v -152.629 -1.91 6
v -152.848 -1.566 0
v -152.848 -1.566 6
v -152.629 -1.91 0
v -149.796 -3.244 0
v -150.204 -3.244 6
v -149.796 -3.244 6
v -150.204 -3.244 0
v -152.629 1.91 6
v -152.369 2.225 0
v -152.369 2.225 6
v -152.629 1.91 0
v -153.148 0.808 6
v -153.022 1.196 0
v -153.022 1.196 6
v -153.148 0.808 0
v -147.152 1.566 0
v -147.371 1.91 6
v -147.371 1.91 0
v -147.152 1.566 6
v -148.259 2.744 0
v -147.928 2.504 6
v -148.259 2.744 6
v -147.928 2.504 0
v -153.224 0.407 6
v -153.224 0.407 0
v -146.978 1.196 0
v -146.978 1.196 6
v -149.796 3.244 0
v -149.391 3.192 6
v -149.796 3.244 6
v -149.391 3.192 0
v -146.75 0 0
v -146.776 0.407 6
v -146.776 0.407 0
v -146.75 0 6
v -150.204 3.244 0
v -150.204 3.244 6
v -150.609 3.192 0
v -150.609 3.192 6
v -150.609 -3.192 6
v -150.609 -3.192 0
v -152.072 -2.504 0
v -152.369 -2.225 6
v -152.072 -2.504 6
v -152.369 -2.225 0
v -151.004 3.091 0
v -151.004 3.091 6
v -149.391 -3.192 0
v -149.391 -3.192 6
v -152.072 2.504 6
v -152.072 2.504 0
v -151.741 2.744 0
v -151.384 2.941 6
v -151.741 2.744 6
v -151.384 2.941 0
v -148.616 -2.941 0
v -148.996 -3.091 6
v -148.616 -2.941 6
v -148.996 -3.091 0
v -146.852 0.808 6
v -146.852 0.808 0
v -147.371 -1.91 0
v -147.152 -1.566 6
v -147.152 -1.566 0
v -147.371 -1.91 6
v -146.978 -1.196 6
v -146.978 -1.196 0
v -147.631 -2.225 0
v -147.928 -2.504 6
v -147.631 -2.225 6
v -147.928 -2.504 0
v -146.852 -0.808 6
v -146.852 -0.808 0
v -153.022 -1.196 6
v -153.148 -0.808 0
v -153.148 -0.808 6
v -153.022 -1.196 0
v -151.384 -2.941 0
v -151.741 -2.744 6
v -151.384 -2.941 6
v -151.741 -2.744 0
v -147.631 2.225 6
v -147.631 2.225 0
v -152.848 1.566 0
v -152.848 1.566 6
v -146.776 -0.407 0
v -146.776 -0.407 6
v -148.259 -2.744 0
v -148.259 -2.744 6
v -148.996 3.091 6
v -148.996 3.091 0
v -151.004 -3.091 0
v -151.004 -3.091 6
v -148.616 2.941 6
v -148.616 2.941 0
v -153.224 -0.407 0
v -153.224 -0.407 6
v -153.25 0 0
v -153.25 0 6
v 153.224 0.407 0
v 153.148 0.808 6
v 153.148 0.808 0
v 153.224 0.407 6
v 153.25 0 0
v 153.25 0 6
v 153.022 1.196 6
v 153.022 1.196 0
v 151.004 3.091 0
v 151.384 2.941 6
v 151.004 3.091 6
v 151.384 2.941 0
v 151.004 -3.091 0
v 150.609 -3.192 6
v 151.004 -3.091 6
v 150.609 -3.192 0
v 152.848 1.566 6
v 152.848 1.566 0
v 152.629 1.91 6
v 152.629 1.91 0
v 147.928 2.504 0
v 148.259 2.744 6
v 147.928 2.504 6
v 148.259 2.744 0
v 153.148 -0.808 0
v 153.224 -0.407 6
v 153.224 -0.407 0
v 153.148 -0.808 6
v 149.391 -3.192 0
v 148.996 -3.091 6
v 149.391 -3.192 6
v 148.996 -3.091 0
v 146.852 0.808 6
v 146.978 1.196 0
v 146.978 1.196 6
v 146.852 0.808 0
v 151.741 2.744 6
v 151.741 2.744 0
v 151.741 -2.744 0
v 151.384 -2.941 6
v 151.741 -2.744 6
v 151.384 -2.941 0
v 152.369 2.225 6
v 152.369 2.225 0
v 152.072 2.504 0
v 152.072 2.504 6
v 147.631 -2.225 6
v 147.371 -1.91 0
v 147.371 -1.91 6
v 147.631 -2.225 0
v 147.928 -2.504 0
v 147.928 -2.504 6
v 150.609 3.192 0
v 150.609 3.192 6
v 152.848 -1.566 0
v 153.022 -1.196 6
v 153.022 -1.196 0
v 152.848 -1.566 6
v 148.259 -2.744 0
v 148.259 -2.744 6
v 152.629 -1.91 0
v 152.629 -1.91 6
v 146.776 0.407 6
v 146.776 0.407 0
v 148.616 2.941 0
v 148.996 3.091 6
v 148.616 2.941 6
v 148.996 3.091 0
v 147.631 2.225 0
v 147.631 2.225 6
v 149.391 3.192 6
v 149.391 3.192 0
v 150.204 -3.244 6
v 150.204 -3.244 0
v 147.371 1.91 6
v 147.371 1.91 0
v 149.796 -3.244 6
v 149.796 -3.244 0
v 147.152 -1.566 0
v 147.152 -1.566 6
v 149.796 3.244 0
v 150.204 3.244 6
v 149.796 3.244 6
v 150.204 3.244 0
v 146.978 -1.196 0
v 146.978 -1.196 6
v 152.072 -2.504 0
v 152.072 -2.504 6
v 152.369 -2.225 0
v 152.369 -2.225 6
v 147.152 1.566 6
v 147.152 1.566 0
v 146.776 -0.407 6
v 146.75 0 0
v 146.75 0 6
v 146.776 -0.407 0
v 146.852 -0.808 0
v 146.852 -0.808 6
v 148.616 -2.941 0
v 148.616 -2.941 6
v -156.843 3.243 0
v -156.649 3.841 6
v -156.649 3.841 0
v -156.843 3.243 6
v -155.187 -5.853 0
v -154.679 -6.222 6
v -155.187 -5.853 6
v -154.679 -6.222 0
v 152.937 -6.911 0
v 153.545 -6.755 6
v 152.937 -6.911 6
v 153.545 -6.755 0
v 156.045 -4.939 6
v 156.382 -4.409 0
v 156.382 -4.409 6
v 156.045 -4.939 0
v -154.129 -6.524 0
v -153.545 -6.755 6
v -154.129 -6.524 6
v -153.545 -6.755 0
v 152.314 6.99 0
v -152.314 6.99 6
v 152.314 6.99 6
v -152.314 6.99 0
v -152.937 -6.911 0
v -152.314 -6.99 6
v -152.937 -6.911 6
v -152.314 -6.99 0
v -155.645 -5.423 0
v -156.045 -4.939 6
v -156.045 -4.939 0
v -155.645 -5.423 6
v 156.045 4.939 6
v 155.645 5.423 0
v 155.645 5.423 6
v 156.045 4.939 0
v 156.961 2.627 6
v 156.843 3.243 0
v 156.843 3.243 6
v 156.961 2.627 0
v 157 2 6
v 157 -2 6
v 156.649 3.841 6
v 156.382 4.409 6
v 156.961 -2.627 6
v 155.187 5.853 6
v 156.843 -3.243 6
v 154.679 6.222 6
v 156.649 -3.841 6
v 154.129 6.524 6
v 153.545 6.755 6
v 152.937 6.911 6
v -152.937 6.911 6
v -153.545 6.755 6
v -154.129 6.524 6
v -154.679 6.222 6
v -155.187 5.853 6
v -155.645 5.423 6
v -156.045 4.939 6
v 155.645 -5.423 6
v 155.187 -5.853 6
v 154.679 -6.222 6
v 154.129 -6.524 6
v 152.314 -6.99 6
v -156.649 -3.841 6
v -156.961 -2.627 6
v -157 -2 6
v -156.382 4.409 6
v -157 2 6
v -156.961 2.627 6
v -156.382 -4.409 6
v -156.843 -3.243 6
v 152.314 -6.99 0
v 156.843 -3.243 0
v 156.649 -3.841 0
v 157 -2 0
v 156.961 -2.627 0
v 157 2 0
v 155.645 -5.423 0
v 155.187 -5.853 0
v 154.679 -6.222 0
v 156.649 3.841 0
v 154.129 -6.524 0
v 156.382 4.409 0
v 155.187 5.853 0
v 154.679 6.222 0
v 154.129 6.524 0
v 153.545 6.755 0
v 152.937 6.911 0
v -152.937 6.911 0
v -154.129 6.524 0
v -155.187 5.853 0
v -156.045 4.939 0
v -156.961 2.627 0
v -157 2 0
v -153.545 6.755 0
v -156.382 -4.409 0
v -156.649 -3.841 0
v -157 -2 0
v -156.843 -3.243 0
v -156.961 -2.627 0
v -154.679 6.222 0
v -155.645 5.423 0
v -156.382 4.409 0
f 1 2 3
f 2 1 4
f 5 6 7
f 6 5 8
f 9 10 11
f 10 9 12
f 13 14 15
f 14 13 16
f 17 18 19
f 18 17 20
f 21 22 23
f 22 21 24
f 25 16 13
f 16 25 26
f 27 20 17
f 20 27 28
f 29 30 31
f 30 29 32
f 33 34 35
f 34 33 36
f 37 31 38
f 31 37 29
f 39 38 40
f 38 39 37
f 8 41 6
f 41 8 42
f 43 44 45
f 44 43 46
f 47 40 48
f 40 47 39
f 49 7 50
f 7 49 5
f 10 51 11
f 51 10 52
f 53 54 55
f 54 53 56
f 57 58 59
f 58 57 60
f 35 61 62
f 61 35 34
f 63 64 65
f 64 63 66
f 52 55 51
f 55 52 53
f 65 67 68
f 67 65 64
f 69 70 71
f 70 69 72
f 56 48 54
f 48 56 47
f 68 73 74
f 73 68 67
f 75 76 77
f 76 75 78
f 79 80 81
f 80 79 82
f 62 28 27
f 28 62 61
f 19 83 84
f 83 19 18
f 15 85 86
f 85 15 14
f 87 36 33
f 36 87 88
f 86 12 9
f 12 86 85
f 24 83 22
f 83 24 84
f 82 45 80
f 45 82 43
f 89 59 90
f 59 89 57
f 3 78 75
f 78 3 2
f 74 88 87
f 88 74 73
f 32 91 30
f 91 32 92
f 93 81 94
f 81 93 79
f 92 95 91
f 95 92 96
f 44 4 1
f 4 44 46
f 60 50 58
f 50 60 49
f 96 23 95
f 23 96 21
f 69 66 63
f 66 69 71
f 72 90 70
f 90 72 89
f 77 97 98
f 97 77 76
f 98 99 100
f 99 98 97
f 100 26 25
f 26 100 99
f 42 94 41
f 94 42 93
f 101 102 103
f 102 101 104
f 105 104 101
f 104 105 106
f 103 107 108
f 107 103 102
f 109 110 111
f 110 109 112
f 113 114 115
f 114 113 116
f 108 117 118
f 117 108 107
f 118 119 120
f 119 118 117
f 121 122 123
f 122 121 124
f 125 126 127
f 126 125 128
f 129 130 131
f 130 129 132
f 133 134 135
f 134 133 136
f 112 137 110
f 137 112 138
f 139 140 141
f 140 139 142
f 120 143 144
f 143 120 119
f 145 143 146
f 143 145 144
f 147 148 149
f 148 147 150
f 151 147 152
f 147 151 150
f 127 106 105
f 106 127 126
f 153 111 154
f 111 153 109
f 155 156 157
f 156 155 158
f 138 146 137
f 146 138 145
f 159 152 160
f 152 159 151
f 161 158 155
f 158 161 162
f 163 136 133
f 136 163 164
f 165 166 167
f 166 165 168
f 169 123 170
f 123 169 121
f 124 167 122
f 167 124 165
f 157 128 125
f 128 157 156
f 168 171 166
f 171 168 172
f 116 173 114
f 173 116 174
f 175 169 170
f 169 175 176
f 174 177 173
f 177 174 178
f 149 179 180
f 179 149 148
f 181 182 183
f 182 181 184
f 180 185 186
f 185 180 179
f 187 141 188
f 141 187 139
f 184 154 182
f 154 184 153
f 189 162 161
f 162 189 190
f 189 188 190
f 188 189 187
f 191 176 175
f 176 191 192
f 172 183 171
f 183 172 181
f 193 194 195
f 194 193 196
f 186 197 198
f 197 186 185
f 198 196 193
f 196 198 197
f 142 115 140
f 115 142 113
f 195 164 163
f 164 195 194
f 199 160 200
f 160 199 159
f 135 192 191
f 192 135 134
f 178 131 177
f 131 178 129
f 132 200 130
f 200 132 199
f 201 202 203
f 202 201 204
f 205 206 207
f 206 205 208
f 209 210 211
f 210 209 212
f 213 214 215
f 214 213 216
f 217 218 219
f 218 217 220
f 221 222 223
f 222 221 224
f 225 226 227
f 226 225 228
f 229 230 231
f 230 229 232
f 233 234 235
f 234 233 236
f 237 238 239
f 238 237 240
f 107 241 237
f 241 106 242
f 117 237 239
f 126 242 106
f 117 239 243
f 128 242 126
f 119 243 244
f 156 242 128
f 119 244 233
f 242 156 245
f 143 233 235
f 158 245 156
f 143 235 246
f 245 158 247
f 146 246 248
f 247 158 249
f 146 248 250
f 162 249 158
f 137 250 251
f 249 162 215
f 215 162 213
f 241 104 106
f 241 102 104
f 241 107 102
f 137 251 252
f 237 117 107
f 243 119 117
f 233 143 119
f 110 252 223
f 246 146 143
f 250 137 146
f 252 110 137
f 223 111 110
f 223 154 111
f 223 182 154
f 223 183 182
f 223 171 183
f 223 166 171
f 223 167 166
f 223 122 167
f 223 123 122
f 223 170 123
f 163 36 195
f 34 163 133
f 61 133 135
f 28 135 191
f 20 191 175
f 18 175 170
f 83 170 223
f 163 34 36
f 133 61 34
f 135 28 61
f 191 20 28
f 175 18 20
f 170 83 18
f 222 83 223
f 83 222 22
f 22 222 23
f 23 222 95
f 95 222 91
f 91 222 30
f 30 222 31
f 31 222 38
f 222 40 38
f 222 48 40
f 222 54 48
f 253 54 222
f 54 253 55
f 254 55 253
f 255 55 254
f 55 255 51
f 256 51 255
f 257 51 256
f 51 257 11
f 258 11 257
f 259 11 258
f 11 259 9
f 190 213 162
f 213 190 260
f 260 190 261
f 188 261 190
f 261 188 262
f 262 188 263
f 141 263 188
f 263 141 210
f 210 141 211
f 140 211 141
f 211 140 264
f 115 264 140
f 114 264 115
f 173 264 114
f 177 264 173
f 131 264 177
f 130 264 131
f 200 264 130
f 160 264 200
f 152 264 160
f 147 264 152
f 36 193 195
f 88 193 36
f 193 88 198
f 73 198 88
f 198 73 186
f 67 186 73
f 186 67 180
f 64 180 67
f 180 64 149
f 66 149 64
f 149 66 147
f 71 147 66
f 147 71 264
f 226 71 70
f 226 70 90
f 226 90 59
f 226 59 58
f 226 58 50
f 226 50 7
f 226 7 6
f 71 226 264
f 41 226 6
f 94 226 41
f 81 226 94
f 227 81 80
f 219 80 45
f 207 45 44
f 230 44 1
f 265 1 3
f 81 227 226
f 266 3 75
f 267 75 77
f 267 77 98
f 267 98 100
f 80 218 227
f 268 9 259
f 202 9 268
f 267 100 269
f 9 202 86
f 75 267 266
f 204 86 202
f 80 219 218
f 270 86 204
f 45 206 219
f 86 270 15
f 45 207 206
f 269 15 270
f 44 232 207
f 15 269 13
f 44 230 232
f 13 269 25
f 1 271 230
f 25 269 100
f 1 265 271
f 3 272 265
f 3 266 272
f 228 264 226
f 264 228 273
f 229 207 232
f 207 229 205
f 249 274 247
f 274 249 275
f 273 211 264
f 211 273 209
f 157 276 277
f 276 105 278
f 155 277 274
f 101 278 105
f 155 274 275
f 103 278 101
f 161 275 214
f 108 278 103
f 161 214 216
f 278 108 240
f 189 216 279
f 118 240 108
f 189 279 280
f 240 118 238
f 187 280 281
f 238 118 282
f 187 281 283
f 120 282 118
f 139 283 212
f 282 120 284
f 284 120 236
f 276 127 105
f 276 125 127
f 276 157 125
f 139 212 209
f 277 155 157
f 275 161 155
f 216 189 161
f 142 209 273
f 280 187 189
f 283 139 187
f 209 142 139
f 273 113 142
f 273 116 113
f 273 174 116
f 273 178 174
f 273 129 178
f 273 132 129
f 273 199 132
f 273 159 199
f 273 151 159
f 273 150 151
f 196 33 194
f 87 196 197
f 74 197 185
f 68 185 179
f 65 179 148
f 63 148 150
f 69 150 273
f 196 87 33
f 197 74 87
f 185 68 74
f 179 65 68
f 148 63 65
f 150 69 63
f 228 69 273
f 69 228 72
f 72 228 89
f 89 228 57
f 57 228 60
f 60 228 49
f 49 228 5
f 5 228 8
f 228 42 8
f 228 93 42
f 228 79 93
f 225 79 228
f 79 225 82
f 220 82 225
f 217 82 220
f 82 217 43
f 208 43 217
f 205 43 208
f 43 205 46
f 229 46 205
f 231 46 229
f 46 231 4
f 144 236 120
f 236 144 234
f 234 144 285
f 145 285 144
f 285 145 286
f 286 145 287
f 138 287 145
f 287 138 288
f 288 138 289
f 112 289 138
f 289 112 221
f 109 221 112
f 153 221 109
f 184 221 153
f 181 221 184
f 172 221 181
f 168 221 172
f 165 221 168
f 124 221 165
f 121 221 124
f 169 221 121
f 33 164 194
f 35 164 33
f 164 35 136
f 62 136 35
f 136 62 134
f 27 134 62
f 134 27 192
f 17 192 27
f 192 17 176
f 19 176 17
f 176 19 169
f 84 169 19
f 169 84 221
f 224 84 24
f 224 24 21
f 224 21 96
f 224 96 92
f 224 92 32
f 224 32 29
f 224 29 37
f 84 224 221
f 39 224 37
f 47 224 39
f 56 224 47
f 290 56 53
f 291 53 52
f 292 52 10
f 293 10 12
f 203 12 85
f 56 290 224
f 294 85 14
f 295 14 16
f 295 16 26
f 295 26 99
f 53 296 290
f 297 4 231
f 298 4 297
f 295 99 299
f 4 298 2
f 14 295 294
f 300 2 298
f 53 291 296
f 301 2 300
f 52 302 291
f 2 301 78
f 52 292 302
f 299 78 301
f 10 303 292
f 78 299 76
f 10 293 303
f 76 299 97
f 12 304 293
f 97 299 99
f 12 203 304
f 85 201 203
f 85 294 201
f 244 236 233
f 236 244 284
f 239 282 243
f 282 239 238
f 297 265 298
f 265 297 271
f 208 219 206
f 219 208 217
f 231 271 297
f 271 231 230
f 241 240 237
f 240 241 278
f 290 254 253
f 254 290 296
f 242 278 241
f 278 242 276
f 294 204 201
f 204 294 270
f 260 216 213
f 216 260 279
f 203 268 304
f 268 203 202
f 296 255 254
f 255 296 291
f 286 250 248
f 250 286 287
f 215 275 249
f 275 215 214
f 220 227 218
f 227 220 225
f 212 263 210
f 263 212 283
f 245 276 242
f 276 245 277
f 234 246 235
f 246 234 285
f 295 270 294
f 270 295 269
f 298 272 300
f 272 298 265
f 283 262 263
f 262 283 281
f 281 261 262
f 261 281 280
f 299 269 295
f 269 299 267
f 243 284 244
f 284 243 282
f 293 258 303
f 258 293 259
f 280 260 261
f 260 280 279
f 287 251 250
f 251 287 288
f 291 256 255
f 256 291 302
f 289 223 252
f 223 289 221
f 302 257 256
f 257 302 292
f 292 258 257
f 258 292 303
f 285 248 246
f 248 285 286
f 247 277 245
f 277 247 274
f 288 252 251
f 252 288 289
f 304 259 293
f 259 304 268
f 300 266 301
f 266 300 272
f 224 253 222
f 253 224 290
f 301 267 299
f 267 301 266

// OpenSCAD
$fn = 50;


difference() {
	union() {
		hull() {
			translate(v = [-152.0000000000, 2.0000000000, 0]) {
				cylinder(h = 6, r = 5);
			}
			translate(v = [152.0000000000, 2.0000000000, 0]) {
				cylinder(h = 6, r = 5);
			}
			translate(v = [-152.0000000000, -2.0000000000, 0]) {
				cylinder(h = 6, r = 5);
			}
			translate(v = [152.0000000000, -2.0000000000, 0]) {
				cylinder(h = 6, r = 5);
			}
		}
	}
	union() {
		translate(v = [-150.0000000000, 0.0000000000, -100.0000000000]) {
			cylinder(h = 200, r = 3.2500000000);
		}
		translate(v = [-150.0000000000, 0.0000000000, -100.0000000000]) {
			cylinder(h = 200, r = 3.2500000000);
		}
		translate(v = [150.0000000000, 0.0000000000, -100.0000000000]) {
			cylinder(h = 200, r = 3.2500000000);
		}
		translate(v = [150.0000000000, 0.0000000000, -100.0000000000]) {
			cylinder(h = 200, r = 3.2500000000);
		}
	}
}
